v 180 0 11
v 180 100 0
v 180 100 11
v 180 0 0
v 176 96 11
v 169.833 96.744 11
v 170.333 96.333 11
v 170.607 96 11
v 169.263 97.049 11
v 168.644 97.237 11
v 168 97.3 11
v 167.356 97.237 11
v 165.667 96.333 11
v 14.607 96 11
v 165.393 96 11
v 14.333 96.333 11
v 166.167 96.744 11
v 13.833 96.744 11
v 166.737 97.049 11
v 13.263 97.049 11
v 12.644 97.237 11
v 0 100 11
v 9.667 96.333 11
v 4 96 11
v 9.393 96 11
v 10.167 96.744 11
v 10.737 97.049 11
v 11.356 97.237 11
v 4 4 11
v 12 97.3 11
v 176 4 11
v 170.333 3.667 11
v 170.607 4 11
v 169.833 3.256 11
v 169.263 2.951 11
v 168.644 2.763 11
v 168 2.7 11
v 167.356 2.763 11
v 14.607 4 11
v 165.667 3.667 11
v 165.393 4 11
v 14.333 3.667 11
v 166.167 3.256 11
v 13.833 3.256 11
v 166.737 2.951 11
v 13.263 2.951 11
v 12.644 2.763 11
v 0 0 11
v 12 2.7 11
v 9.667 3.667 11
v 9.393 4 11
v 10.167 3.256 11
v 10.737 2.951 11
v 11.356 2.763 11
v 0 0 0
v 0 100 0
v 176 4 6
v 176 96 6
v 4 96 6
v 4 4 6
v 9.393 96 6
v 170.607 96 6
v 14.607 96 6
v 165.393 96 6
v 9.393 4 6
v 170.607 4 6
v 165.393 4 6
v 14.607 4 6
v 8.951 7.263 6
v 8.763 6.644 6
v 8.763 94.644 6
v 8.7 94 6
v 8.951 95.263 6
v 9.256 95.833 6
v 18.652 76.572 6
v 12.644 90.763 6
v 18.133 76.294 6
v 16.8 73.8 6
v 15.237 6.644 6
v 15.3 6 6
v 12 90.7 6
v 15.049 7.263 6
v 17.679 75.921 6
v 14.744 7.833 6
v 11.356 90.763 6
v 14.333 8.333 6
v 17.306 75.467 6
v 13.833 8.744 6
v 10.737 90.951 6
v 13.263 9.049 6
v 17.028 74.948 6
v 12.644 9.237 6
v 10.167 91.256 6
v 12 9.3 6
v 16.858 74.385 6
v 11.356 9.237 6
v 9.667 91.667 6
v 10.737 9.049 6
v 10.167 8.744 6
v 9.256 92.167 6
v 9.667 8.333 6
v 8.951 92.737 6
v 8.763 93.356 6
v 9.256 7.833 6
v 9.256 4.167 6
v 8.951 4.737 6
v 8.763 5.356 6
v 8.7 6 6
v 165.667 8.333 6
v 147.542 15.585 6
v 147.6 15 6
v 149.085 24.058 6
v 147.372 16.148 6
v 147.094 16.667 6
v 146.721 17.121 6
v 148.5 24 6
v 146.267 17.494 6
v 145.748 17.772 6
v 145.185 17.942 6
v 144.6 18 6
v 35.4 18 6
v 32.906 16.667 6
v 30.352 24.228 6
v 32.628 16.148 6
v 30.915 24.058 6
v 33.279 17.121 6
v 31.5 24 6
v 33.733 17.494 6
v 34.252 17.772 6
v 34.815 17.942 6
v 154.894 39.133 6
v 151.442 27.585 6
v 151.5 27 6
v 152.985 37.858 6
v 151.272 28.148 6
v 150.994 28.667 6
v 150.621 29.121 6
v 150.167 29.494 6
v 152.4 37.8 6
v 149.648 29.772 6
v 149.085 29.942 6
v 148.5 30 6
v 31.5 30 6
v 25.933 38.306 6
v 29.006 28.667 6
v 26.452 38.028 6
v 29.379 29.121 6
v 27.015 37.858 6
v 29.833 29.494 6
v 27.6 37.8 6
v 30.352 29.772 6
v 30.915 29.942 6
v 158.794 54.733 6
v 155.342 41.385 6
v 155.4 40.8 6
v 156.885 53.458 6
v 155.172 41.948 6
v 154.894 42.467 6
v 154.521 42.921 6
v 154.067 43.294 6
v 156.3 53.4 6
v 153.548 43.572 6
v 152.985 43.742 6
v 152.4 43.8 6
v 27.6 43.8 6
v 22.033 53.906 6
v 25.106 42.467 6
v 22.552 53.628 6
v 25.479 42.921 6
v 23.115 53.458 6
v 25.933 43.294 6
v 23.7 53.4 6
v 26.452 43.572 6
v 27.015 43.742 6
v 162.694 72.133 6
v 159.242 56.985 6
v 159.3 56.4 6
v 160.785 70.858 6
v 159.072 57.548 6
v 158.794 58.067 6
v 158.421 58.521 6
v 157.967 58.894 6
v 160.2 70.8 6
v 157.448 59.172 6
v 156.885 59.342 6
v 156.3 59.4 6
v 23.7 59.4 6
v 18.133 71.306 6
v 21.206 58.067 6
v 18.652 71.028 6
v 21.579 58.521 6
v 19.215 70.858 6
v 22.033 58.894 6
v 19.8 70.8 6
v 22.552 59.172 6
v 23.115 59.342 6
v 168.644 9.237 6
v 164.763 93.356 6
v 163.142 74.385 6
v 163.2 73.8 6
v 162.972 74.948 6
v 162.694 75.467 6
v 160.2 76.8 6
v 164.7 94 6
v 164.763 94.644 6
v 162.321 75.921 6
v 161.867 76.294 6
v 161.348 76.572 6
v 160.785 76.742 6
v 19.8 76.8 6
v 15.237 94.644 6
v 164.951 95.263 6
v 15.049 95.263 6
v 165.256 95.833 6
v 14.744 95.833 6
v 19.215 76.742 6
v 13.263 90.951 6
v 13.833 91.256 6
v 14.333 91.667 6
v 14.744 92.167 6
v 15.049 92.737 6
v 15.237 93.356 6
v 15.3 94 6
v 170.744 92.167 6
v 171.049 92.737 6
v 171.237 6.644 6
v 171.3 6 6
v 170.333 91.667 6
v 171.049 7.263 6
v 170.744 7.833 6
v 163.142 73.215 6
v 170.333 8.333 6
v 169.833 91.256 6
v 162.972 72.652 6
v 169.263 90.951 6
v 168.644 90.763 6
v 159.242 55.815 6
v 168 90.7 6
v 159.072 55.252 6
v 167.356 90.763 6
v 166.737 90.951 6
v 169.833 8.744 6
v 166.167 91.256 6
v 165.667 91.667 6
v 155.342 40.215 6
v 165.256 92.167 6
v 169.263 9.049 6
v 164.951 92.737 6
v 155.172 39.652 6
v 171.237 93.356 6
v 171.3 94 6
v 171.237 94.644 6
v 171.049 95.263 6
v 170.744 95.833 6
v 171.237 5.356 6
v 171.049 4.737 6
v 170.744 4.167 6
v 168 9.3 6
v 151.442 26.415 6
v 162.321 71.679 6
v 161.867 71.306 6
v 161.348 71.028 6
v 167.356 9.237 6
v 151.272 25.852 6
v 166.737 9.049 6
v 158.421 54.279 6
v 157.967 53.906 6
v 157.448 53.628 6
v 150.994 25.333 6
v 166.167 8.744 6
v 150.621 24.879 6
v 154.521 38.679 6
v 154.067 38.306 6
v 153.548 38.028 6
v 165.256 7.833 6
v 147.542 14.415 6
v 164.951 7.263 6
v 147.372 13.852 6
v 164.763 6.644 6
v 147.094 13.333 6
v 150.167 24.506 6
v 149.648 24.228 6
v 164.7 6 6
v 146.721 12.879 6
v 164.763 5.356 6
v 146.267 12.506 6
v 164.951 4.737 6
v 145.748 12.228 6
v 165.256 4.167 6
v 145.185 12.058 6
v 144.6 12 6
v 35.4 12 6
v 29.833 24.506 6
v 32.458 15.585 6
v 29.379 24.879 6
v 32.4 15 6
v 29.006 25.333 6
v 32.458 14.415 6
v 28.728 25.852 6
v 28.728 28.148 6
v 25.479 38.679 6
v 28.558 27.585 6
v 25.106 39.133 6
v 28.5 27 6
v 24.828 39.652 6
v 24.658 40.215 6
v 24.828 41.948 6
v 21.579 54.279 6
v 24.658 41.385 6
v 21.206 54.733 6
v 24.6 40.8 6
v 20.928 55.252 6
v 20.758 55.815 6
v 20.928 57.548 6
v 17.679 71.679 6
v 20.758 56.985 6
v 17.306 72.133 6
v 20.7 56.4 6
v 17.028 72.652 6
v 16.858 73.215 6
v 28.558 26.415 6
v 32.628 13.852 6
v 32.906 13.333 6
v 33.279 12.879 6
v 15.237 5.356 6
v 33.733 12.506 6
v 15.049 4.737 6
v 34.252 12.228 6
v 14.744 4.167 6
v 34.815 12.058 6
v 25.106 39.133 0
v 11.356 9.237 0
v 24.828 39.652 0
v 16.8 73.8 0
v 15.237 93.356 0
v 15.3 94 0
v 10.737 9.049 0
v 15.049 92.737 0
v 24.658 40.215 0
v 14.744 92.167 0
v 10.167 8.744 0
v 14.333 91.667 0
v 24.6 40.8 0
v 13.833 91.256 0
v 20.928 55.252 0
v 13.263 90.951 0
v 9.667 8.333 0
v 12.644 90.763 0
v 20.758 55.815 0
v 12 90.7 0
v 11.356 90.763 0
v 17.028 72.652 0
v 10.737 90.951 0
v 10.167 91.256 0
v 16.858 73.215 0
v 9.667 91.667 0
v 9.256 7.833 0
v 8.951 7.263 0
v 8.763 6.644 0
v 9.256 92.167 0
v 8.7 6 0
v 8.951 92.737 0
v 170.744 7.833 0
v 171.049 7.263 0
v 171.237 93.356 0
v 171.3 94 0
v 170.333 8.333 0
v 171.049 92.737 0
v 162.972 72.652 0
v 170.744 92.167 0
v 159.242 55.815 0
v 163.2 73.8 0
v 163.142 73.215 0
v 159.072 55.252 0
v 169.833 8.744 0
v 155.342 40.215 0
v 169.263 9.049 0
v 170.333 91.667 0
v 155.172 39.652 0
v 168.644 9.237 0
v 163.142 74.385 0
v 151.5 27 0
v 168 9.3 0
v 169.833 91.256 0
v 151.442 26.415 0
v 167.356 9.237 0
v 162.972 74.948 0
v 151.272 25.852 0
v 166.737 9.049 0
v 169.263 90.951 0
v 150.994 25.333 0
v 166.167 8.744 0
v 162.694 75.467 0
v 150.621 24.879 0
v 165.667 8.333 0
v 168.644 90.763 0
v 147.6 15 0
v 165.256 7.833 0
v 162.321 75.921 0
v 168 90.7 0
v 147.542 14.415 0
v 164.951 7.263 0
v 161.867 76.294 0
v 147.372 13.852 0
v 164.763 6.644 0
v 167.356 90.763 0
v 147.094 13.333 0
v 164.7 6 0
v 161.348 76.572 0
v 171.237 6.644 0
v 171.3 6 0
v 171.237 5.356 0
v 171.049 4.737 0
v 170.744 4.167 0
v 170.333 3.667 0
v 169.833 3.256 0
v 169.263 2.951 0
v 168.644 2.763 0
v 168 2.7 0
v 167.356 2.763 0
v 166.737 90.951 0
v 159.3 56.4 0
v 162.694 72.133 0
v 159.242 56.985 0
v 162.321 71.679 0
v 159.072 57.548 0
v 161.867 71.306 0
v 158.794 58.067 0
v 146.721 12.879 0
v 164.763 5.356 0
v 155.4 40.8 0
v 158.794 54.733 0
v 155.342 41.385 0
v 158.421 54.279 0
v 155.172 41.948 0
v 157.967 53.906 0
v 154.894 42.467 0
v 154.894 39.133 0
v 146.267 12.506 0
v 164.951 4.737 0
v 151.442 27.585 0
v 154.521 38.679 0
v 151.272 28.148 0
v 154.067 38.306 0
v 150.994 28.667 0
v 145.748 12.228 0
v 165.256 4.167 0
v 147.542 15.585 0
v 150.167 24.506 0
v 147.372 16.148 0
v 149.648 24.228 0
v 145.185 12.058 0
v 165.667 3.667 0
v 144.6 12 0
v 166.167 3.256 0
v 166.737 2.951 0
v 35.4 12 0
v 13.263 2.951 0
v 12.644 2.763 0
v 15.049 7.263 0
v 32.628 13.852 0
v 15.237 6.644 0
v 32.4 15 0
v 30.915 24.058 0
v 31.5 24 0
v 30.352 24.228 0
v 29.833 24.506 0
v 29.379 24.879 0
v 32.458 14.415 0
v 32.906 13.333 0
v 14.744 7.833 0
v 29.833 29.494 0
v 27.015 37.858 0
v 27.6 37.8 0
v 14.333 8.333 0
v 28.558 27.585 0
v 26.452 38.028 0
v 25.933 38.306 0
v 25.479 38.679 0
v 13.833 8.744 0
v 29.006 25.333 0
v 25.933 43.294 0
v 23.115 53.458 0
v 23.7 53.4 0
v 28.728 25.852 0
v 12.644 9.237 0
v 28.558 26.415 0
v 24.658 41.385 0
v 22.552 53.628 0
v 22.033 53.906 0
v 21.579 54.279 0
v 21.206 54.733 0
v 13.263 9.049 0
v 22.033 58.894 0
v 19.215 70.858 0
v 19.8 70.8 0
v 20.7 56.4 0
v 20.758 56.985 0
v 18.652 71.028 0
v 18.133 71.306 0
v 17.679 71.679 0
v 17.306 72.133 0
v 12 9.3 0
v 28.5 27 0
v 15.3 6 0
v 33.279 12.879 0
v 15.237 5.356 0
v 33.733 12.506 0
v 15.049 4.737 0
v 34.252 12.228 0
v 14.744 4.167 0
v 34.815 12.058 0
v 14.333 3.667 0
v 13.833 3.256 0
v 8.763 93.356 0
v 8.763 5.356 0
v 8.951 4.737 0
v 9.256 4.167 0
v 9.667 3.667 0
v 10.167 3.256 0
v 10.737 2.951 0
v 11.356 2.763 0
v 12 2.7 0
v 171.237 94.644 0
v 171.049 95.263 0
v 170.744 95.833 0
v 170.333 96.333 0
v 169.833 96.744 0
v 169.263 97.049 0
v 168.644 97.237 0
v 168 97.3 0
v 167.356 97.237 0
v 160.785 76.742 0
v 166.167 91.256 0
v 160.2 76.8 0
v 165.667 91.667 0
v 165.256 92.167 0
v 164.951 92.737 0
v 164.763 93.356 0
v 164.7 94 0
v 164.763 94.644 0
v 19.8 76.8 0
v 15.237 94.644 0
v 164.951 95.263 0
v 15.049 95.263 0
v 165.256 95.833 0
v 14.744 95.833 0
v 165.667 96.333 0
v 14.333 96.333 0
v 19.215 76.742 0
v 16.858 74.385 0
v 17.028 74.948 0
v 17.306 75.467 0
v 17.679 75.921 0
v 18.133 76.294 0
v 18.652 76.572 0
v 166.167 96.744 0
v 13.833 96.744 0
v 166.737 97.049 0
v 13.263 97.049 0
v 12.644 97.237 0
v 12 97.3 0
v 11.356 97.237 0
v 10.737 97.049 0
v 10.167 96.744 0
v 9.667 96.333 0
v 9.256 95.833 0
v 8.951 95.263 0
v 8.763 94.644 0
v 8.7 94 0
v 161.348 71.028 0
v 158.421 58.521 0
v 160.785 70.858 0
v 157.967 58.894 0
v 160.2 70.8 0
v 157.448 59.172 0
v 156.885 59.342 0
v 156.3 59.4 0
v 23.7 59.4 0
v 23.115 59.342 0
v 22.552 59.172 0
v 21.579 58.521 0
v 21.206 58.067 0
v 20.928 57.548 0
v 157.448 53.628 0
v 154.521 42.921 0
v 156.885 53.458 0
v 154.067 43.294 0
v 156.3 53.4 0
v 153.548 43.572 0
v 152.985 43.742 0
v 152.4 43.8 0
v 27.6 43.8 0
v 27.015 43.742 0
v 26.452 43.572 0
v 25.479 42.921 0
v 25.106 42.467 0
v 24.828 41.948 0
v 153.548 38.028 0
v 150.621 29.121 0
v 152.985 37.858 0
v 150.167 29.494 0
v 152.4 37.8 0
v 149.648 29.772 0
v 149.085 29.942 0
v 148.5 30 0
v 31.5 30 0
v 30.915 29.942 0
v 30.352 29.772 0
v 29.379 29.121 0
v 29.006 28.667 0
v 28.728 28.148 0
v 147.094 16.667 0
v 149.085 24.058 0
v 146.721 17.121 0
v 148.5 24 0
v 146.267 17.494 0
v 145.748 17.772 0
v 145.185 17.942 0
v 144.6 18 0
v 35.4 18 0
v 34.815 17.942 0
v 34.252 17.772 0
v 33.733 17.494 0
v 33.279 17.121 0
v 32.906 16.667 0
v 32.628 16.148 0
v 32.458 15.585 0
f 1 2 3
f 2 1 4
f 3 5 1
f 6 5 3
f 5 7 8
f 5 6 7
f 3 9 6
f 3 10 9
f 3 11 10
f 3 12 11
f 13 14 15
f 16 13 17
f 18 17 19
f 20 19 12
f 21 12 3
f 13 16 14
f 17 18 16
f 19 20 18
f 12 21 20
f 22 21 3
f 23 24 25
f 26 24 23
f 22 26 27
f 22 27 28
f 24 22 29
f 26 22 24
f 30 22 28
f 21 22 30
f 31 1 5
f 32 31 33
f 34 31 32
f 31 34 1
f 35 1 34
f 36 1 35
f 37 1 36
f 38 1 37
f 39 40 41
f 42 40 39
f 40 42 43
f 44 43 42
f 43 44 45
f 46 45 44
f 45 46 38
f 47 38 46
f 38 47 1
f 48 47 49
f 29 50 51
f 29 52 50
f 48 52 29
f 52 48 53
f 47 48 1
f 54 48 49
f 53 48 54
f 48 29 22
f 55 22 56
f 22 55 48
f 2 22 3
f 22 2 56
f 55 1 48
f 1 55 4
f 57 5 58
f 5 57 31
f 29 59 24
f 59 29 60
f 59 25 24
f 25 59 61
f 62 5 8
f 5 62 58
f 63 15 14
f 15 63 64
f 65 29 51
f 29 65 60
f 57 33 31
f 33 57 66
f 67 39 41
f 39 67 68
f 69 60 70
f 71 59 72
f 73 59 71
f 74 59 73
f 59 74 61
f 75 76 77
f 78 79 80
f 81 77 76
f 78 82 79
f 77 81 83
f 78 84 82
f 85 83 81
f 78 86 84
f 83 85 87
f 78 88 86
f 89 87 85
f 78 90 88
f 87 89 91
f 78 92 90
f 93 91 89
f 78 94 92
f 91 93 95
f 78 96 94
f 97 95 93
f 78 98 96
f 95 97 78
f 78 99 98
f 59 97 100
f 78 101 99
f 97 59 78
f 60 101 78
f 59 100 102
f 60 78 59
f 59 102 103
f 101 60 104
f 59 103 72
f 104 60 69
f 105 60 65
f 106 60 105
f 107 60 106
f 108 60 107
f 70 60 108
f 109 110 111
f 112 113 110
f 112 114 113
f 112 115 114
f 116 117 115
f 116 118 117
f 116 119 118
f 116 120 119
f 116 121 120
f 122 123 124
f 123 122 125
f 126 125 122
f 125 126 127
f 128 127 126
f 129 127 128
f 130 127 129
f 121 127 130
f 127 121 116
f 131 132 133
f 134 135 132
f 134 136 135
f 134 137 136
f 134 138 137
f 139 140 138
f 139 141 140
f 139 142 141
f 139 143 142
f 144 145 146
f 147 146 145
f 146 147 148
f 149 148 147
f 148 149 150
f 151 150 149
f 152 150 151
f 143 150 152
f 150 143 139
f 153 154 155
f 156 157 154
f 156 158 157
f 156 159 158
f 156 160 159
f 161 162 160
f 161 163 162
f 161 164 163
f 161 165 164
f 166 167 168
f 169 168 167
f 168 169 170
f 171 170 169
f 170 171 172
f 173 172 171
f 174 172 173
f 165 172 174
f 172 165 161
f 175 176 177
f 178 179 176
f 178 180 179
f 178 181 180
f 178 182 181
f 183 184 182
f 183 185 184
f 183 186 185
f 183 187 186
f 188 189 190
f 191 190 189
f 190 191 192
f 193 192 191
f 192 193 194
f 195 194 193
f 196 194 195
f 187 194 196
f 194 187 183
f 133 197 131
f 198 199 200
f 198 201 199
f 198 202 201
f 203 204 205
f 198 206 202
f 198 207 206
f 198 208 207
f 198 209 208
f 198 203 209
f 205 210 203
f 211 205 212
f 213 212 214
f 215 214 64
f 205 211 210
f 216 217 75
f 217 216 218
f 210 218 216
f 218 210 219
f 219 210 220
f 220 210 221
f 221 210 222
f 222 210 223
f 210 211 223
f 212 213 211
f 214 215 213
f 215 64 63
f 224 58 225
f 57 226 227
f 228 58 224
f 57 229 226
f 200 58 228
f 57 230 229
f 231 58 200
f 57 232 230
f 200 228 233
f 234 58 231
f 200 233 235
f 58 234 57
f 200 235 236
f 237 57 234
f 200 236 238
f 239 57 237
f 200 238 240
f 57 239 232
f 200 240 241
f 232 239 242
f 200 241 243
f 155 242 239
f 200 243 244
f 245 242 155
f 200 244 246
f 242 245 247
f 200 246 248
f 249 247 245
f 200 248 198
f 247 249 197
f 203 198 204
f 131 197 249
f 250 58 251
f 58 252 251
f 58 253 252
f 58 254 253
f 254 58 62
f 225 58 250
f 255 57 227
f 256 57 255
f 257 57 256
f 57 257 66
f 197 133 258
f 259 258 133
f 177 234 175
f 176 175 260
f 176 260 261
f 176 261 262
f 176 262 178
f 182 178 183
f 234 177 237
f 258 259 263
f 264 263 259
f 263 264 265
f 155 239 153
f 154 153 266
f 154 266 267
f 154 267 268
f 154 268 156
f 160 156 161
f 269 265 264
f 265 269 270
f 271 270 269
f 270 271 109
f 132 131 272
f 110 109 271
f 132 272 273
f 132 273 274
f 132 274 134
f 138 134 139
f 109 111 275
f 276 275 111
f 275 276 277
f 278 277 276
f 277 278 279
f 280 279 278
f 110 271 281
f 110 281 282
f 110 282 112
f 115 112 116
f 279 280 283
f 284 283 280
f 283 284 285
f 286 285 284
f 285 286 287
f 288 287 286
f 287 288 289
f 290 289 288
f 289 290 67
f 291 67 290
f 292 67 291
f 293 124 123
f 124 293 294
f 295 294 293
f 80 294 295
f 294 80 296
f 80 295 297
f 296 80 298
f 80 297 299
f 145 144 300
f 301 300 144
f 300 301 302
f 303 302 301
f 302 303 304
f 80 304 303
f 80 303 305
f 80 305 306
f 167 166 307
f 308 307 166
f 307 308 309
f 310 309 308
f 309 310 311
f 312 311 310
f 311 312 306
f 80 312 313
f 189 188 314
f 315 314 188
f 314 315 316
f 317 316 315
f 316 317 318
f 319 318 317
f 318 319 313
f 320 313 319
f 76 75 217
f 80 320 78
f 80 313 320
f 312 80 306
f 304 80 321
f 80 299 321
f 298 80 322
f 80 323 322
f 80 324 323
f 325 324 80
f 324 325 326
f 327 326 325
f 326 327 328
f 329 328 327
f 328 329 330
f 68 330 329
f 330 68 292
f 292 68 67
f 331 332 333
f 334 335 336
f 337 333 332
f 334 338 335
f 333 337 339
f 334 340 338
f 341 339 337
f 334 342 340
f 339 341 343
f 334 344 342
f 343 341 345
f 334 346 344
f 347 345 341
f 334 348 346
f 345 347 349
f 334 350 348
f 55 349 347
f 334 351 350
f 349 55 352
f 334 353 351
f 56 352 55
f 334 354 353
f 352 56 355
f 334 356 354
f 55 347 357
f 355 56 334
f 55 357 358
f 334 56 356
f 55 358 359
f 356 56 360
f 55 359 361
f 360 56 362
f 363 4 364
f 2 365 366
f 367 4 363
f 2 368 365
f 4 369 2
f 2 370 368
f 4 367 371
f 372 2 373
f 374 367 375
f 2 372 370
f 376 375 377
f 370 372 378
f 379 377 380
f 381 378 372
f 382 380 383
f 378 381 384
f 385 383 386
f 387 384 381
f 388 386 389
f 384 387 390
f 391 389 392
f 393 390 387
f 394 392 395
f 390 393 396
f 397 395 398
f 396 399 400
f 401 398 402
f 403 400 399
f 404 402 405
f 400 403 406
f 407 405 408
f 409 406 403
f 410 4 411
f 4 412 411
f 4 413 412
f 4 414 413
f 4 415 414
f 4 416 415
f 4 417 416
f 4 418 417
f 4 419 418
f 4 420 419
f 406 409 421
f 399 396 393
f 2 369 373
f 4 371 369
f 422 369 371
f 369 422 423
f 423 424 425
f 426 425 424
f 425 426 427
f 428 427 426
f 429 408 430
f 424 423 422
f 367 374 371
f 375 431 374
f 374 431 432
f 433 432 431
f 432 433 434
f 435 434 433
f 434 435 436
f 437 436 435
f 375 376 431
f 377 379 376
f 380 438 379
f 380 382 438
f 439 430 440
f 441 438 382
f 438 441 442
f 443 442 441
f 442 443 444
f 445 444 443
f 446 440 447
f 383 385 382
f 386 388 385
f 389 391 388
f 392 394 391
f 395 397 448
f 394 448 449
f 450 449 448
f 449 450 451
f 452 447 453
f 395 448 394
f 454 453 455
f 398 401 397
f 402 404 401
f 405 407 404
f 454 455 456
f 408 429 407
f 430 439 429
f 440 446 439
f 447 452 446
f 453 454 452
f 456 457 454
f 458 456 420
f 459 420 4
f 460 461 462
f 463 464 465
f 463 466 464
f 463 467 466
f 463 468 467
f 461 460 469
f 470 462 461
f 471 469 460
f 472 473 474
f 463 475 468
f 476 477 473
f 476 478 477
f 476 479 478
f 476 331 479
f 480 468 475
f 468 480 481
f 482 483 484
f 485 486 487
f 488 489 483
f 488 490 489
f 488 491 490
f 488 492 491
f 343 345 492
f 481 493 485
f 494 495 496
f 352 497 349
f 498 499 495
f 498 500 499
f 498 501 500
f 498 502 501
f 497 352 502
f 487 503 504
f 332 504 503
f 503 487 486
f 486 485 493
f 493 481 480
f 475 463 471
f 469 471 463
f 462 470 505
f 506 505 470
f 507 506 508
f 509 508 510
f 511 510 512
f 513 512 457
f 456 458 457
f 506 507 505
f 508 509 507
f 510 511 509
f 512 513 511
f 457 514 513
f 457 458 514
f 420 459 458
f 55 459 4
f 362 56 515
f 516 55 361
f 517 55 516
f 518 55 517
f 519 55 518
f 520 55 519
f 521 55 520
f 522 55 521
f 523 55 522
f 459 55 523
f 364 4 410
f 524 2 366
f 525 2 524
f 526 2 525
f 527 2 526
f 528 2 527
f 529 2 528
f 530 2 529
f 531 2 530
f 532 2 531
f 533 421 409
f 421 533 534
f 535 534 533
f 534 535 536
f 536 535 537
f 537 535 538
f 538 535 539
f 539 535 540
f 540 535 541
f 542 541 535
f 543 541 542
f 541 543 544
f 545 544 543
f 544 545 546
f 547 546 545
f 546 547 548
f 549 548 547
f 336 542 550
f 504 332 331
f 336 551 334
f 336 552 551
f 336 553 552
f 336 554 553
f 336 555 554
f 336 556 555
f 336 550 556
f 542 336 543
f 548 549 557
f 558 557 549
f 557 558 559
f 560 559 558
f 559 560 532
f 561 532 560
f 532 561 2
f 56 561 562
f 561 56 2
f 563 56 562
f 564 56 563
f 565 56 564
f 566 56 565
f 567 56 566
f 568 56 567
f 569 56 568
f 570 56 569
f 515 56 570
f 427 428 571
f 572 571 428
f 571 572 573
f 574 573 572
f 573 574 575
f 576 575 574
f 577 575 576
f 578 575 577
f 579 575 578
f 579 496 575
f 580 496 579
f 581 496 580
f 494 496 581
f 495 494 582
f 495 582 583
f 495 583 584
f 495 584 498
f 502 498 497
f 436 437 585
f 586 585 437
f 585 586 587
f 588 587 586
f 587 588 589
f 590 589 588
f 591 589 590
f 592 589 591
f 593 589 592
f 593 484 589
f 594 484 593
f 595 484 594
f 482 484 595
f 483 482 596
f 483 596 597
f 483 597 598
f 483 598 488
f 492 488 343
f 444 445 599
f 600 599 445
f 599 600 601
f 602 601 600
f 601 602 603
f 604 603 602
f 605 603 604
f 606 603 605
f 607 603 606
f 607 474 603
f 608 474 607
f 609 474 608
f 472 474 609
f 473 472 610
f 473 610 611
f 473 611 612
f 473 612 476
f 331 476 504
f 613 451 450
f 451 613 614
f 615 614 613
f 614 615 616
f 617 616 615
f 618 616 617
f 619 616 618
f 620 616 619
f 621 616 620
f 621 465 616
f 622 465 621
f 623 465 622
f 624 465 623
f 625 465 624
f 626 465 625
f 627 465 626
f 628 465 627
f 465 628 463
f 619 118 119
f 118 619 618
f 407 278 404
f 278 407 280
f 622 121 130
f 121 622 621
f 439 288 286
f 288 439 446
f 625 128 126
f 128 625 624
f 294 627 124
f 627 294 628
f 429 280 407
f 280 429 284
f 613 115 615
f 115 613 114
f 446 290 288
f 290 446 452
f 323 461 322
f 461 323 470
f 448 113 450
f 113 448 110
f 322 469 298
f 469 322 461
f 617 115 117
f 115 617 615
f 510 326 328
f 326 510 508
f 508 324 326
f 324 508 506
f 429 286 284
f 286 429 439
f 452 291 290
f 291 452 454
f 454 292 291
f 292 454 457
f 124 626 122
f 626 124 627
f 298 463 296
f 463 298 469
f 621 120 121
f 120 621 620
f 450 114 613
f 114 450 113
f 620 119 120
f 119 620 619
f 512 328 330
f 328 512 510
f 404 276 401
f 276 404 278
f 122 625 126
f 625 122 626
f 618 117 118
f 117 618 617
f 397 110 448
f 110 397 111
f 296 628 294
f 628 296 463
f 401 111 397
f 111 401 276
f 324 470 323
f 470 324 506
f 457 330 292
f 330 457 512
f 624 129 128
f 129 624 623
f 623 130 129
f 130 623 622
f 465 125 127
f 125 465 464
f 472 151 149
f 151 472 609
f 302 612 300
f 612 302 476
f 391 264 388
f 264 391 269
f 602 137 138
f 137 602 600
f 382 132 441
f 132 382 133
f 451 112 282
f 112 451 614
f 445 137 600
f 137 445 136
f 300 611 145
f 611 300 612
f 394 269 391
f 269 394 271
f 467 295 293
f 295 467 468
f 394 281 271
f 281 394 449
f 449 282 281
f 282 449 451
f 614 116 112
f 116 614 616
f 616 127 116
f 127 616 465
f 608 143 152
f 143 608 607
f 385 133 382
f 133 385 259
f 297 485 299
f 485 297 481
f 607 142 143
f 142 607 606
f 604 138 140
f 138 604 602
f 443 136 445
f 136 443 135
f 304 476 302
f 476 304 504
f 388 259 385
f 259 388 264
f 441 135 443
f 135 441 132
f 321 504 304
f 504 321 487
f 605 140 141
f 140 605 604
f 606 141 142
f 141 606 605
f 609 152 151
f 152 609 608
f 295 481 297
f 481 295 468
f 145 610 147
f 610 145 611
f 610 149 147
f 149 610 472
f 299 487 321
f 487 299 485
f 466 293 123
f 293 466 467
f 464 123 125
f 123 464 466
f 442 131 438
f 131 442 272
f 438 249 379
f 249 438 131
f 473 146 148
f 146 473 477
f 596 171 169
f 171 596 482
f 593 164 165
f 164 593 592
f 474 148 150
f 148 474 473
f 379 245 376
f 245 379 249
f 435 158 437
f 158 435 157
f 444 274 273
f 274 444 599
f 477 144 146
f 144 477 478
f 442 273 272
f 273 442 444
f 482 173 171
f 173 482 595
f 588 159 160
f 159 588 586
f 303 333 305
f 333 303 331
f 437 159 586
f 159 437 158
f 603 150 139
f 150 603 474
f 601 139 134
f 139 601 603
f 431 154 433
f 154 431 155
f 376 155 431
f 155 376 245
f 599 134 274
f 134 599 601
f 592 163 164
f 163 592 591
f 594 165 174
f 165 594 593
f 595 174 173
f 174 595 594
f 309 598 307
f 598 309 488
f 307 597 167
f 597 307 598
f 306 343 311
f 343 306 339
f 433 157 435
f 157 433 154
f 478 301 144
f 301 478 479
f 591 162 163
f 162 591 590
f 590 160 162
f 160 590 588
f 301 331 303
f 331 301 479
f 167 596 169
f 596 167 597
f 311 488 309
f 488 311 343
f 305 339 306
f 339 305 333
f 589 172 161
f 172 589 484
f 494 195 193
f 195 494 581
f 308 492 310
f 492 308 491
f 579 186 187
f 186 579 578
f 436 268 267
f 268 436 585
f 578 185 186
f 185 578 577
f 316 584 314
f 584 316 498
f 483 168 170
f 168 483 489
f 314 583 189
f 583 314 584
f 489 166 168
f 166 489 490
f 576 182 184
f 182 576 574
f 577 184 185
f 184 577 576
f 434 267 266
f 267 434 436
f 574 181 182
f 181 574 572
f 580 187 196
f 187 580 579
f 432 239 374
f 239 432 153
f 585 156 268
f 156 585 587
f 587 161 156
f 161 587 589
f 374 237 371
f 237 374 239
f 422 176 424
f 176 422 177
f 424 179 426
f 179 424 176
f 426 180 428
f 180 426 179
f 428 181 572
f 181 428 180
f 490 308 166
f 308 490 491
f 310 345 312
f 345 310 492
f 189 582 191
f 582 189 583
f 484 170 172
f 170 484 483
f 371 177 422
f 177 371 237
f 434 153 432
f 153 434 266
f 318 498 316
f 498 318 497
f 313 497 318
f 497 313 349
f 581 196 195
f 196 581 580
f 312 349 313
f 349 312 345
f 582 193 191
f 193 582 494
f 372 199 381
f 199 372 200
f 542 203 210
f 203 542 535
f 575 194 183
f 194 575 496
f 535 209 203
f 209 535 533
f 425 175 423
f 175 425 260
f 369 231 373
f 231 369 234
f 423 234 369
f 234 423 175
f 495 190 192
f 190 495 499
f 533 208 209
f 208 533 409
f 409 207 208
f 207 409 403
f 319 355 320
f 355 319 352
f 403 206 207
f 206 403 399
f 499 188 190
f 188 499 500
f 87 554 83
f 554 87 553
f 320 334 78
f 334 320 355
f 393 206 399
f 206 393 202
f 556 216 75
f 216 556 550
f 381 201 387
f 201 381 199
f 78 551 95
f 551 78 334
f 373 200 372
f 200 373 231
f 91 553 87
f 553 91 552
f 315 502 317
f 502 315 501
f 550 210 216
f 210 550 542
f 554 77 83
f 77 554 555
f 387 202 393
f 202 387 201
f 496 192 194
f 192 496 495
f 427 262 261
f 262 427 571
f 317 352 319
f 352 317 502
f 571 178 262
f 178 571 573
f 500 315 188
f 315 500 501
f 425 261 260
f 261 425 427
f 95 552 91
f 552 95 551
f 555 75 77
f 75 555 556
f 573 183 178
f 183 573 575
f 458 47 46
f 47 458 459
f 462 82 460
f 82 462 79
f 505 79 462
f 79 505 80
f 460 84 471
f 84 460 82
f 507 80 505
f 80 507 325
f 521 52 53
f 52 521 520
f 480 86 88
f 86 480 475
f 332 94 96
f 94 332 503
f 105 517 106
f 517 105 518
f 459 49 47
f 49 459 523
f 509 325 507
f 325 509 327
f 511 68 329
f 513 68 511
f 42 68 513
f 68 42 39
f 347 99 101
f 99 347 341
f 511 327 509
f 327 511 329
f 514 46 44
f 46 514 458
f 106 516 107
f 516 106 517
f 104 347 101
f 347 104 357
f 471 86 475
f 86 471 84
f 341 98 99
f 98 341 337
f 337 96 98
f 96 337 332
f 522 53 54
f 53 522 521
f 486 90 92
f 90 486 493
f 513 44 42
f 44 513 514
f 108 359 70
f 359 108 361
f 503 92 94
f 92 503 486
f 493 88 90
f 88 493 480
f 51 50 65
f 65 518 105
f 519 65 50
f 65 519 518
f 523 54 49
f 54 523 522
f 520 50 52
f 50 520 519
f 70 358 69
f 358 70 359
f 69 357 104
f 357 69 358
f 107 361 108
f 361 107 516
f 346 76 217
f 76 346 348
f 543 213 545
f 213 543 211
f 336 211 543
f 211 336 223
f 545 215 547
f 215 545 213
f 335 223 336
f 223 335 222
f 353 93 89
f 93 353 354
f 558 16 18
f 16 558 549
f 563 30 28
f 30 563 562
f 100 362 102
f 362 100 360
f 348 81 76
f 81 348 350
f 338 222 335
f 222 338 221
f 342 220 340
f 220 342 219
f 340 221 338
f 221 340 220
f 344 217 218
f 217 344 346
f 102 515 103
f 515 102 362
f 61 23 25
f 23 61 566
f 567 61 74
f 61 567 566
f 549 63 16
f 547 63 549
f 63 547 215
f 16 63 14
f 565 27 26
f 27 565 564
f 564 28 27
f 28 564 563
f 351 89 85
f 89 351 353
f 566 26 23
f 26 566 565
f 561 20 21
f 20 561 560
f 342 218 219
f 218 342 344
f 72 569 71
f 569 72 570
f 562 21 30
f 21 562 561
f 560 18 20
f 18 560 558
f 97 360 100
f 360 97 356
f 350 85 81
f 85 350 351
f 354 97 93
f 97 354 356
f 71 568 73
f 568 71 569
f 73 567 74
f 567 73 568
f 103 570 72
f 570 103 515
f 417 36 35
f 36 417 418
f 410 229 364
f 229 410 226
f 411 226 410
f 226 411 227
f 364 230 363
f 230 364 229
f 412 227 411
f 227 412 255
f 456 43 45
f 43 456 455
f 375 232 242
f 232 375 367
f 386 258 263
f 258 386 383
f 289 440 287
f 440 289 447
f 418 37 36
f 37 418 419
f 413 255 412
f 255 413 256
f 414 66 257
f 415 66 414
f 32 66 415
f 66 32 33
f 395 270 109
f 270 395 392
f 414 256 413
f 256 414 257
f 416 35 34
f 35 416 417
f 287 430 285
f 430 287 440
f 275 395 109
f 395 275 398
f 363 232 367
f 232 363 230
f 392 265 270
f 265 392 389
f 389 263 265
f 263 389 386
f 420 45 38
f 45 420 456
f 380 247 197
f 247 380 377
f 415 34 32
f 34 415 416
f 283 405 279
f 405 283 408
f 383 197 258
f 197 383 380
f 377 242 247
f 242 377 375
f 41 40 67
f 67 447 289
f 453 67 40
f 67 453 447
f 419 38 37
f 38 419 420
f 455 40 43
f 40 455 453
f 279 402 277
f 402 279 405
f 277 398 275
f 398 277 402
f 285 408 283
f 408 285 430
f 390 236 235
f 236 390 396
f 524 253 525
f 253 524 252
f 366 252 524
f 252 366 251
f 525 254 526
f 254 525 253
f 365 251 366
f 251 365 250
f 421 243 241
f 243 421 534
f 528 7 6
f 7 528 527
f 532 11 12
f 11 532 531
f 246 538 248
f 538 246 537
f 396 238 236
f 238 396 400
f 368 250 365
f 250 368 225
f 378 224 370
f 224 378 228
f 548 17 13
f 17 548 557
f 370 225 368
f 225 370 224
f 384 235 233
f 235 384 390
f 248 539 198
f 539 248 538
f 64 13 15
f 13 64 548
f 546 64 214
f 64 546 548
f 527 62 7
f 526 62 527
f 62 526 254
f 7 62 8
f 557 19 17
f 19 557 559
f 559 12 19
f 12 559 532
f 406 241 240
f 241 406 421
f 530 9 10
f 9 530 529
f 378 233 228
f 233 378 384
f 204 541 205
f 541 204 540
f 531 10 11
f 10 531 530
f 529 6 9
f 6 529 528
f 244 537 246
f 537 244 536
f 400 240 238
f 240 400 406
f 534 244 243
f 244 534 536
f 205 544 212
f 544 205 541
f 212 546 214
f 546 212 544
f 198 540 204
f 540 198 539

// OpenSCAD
$fn = 32;

// ----------------------------------------------------------------------
// Slotted panel: 180 x 100 mm, 5 рядов of slots
// ----------------------------------------------------------------------

// --- parameters (mm) ---
panel_w = 180;            // panel width
panel_d = 100;            // panel depth
thick = 6;                // panel thickness
slot_w = 6;               // slot width
pitch0 = 12;              // first row pitch
pitch_step = 1.8;         // pitch increase per row
margin = 12;              // margin around the slot field
rows = 5;                 // number of slot rows
mount_d = 6.6;            // mounting holes
mount_x = 78;             // mounting hole offset
rim_h = 11;               // rim height
rim_t = 4;                // rim wall thickness

difference() {
  union() {
    cube([panel_w, panel_d, thick]);
    translate([0, 0, thick - 1]) difference() {
      cube([panel_w, panel_d, rim_h - thick + 1]);
      translate([rim_t, rim_t, -2.5]) cube([panel_w - 2 * rim_t, panel_d - 2 * rim_t, rim_h - thick + 6]);
    }
  }
  /* slot rows: stadium shaped cutters, 2.5 mm clear of both faces */
  /* row 0: pitch 12, length 109.2 */
  hull() {
    translate([35.4, 15, -2.5]) cylinder(h = thick + 5, d = slot_w);
    translate([144.6, 15, -2.5]) cylinder(h = thick + 5, d = slot_w);
  }
  /* row 1: pitch 13.8, length 117 */
  hull() {
    translate([31.5, 27, -2.5]) cylinder(h = thick + 5, d = slot_w);
    translate([148.5, 27, -2.5]) cylinder(h = thick + 5, d = slot_w);
  }
  /* row 2: pitch 15.6, length 124.8 */
  hull() {
    translate([27.6, 40.8, -2.5]) cylinder(h = thick + 5, d = slot_w);
    translate([152.4, 40.8, -2.5]) cylinder(h = thick + 5, d = slot_w);
  }
  /* row 3: pitch 17.4, length 132.6 */
  hull() {
    translate([23.7, 56.4, -2.5]) cylinder(h = thick + 5, d = slot_w);
    translate([156.3, 56.4, -2.5]) cylinder(h = thick + 5, d = slot_w);
  }
  /* row 4: pitch 19.2, length 140.4 */
  hull() {
    translate([19.8, 73.8, -2.5]) cylinder(h = thick + 5, d = slot_w);
    translate([160.2, 73.8, -2.5]) cylinder(h = thick + 5, d = slot_w);
  }
  translate([12, 6, -2.5]) cylinder(h = 16, d = mount_d);
  translate([12, 94, -2.5]) cylinder(h = 16, d = mount_d);
  translate([168, 6, -2.5]) cylinder(h = 16, d = mount_d);
  translate([168, 94, -2.5]) cylinder(h = 16, d = mount_d);
}
